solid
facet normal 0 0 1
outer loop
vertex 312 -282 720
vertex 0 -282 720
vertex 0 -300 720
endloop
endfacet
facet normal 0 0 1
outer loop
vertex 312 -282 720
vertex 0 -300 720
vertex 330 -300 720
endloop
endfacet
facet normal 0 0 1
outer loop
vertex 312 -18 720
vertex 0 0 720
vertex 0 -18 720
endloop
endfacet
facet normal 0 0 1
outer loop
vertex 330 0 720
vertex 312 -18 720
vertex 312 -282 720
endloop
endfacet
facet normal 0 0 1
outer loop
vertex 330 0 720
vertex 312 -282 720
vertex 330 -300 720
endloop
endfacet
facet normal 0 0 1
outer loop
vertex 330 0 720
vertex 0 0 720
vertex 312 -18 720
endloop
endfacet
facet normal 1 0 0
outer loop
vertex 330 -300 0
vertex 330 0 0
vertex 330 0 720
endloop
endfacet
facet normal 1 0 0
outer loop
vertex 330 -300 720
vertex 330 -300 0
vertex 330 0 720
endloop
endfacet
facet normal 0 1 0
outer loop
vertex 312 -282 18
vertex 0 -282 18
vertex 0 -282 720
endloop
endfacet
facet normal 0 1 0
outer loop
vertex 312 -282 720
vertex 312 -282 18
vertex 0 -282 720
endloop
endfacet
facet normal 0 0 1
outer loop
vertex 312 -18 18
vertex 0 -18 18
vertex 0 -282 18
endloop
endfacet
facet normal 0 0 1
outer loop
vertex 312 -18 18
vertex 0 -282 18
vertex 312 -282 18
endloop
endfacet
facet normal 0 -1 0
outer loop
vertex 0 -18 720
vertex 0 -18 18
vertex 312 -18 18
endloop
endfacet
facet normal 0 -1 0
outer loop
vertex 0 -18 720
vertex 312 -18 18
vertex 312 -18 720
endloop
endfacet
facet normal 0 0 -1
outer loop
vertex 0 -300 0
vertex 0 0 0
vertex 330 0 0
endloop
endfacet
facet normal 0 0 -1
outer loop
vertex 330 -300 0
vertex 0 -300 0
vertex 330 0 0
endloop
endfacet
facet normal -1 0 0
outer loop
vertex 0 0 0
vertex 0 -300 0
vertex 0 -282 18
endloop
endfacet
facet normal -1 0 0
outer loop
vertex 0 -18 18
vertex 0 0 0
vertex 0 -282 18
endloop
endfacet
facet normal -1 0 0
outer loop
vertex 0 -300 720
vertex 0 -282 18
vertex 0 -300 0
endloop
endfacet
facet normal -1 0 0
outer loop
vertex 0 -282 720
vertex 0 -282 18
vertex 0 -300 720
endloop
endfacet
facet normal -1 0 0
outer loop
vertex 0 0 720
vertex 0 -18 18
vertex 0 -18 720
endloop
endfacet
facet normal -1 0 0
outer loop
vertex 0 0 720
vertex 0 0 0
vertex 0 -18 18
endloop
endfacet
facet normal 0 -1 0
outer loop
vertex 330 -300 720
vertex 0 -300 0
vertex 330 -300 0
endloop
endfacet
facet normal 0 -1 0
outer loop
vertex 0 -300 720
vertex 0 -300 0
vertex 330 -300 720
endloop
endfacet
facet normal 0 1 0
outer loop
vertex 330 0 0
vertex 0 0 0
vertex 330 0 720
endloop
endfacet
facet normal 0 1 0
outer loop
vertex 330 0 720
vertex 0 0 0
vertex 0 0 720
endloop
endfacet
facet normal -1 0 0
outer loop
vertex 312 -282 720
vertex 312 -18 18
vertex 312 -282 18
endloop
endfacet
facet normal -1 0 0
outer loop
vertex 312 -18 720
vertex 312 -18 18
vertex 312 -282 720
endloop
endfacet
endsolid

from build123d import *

# Parameters (mm, degrees)
F0_W     = 42.1406924725
F0_H     = 37.6295819879
F1_DEPTH = 330
F2_DEPTH = 300
F3_DEPTH = 720
F4_T     = -18


with BuildPart() as f1:
    # F0 (on Right) → F1 (new body)
    with BuildSketch(Plane.YZ):
        with Locations((-21.0703462362, 18.8147909939)):
            Rectangle(F0_W, F0_H)
    extrude(amount=F1_DEPTH)

    # F2 (add): a face of the model
    f2_faces = [f1.faces().sort_by_distance(p)[0] for p in [
        (165, 0, 18.8147909939),
    ]]
    extrude(f2_faces, amount=-F2_DEPTH)

    # F3 (add): a face of the model
    f3_faces = [f1.faces().sort_by_distance(p)[0] for p in [
        (165, -150, 0),
    ]]
    extrude(f3_faces, amount=-F3_DEPTH)

    # F4
    f4_openings = [f1.faces().sort_by_distance(p)[0] for p in [
        (0, -150, 360),
        (165, -150, 720),
    ]]
    offset(amount=F4_T, openings=f4_openings)


solid = f1.part
